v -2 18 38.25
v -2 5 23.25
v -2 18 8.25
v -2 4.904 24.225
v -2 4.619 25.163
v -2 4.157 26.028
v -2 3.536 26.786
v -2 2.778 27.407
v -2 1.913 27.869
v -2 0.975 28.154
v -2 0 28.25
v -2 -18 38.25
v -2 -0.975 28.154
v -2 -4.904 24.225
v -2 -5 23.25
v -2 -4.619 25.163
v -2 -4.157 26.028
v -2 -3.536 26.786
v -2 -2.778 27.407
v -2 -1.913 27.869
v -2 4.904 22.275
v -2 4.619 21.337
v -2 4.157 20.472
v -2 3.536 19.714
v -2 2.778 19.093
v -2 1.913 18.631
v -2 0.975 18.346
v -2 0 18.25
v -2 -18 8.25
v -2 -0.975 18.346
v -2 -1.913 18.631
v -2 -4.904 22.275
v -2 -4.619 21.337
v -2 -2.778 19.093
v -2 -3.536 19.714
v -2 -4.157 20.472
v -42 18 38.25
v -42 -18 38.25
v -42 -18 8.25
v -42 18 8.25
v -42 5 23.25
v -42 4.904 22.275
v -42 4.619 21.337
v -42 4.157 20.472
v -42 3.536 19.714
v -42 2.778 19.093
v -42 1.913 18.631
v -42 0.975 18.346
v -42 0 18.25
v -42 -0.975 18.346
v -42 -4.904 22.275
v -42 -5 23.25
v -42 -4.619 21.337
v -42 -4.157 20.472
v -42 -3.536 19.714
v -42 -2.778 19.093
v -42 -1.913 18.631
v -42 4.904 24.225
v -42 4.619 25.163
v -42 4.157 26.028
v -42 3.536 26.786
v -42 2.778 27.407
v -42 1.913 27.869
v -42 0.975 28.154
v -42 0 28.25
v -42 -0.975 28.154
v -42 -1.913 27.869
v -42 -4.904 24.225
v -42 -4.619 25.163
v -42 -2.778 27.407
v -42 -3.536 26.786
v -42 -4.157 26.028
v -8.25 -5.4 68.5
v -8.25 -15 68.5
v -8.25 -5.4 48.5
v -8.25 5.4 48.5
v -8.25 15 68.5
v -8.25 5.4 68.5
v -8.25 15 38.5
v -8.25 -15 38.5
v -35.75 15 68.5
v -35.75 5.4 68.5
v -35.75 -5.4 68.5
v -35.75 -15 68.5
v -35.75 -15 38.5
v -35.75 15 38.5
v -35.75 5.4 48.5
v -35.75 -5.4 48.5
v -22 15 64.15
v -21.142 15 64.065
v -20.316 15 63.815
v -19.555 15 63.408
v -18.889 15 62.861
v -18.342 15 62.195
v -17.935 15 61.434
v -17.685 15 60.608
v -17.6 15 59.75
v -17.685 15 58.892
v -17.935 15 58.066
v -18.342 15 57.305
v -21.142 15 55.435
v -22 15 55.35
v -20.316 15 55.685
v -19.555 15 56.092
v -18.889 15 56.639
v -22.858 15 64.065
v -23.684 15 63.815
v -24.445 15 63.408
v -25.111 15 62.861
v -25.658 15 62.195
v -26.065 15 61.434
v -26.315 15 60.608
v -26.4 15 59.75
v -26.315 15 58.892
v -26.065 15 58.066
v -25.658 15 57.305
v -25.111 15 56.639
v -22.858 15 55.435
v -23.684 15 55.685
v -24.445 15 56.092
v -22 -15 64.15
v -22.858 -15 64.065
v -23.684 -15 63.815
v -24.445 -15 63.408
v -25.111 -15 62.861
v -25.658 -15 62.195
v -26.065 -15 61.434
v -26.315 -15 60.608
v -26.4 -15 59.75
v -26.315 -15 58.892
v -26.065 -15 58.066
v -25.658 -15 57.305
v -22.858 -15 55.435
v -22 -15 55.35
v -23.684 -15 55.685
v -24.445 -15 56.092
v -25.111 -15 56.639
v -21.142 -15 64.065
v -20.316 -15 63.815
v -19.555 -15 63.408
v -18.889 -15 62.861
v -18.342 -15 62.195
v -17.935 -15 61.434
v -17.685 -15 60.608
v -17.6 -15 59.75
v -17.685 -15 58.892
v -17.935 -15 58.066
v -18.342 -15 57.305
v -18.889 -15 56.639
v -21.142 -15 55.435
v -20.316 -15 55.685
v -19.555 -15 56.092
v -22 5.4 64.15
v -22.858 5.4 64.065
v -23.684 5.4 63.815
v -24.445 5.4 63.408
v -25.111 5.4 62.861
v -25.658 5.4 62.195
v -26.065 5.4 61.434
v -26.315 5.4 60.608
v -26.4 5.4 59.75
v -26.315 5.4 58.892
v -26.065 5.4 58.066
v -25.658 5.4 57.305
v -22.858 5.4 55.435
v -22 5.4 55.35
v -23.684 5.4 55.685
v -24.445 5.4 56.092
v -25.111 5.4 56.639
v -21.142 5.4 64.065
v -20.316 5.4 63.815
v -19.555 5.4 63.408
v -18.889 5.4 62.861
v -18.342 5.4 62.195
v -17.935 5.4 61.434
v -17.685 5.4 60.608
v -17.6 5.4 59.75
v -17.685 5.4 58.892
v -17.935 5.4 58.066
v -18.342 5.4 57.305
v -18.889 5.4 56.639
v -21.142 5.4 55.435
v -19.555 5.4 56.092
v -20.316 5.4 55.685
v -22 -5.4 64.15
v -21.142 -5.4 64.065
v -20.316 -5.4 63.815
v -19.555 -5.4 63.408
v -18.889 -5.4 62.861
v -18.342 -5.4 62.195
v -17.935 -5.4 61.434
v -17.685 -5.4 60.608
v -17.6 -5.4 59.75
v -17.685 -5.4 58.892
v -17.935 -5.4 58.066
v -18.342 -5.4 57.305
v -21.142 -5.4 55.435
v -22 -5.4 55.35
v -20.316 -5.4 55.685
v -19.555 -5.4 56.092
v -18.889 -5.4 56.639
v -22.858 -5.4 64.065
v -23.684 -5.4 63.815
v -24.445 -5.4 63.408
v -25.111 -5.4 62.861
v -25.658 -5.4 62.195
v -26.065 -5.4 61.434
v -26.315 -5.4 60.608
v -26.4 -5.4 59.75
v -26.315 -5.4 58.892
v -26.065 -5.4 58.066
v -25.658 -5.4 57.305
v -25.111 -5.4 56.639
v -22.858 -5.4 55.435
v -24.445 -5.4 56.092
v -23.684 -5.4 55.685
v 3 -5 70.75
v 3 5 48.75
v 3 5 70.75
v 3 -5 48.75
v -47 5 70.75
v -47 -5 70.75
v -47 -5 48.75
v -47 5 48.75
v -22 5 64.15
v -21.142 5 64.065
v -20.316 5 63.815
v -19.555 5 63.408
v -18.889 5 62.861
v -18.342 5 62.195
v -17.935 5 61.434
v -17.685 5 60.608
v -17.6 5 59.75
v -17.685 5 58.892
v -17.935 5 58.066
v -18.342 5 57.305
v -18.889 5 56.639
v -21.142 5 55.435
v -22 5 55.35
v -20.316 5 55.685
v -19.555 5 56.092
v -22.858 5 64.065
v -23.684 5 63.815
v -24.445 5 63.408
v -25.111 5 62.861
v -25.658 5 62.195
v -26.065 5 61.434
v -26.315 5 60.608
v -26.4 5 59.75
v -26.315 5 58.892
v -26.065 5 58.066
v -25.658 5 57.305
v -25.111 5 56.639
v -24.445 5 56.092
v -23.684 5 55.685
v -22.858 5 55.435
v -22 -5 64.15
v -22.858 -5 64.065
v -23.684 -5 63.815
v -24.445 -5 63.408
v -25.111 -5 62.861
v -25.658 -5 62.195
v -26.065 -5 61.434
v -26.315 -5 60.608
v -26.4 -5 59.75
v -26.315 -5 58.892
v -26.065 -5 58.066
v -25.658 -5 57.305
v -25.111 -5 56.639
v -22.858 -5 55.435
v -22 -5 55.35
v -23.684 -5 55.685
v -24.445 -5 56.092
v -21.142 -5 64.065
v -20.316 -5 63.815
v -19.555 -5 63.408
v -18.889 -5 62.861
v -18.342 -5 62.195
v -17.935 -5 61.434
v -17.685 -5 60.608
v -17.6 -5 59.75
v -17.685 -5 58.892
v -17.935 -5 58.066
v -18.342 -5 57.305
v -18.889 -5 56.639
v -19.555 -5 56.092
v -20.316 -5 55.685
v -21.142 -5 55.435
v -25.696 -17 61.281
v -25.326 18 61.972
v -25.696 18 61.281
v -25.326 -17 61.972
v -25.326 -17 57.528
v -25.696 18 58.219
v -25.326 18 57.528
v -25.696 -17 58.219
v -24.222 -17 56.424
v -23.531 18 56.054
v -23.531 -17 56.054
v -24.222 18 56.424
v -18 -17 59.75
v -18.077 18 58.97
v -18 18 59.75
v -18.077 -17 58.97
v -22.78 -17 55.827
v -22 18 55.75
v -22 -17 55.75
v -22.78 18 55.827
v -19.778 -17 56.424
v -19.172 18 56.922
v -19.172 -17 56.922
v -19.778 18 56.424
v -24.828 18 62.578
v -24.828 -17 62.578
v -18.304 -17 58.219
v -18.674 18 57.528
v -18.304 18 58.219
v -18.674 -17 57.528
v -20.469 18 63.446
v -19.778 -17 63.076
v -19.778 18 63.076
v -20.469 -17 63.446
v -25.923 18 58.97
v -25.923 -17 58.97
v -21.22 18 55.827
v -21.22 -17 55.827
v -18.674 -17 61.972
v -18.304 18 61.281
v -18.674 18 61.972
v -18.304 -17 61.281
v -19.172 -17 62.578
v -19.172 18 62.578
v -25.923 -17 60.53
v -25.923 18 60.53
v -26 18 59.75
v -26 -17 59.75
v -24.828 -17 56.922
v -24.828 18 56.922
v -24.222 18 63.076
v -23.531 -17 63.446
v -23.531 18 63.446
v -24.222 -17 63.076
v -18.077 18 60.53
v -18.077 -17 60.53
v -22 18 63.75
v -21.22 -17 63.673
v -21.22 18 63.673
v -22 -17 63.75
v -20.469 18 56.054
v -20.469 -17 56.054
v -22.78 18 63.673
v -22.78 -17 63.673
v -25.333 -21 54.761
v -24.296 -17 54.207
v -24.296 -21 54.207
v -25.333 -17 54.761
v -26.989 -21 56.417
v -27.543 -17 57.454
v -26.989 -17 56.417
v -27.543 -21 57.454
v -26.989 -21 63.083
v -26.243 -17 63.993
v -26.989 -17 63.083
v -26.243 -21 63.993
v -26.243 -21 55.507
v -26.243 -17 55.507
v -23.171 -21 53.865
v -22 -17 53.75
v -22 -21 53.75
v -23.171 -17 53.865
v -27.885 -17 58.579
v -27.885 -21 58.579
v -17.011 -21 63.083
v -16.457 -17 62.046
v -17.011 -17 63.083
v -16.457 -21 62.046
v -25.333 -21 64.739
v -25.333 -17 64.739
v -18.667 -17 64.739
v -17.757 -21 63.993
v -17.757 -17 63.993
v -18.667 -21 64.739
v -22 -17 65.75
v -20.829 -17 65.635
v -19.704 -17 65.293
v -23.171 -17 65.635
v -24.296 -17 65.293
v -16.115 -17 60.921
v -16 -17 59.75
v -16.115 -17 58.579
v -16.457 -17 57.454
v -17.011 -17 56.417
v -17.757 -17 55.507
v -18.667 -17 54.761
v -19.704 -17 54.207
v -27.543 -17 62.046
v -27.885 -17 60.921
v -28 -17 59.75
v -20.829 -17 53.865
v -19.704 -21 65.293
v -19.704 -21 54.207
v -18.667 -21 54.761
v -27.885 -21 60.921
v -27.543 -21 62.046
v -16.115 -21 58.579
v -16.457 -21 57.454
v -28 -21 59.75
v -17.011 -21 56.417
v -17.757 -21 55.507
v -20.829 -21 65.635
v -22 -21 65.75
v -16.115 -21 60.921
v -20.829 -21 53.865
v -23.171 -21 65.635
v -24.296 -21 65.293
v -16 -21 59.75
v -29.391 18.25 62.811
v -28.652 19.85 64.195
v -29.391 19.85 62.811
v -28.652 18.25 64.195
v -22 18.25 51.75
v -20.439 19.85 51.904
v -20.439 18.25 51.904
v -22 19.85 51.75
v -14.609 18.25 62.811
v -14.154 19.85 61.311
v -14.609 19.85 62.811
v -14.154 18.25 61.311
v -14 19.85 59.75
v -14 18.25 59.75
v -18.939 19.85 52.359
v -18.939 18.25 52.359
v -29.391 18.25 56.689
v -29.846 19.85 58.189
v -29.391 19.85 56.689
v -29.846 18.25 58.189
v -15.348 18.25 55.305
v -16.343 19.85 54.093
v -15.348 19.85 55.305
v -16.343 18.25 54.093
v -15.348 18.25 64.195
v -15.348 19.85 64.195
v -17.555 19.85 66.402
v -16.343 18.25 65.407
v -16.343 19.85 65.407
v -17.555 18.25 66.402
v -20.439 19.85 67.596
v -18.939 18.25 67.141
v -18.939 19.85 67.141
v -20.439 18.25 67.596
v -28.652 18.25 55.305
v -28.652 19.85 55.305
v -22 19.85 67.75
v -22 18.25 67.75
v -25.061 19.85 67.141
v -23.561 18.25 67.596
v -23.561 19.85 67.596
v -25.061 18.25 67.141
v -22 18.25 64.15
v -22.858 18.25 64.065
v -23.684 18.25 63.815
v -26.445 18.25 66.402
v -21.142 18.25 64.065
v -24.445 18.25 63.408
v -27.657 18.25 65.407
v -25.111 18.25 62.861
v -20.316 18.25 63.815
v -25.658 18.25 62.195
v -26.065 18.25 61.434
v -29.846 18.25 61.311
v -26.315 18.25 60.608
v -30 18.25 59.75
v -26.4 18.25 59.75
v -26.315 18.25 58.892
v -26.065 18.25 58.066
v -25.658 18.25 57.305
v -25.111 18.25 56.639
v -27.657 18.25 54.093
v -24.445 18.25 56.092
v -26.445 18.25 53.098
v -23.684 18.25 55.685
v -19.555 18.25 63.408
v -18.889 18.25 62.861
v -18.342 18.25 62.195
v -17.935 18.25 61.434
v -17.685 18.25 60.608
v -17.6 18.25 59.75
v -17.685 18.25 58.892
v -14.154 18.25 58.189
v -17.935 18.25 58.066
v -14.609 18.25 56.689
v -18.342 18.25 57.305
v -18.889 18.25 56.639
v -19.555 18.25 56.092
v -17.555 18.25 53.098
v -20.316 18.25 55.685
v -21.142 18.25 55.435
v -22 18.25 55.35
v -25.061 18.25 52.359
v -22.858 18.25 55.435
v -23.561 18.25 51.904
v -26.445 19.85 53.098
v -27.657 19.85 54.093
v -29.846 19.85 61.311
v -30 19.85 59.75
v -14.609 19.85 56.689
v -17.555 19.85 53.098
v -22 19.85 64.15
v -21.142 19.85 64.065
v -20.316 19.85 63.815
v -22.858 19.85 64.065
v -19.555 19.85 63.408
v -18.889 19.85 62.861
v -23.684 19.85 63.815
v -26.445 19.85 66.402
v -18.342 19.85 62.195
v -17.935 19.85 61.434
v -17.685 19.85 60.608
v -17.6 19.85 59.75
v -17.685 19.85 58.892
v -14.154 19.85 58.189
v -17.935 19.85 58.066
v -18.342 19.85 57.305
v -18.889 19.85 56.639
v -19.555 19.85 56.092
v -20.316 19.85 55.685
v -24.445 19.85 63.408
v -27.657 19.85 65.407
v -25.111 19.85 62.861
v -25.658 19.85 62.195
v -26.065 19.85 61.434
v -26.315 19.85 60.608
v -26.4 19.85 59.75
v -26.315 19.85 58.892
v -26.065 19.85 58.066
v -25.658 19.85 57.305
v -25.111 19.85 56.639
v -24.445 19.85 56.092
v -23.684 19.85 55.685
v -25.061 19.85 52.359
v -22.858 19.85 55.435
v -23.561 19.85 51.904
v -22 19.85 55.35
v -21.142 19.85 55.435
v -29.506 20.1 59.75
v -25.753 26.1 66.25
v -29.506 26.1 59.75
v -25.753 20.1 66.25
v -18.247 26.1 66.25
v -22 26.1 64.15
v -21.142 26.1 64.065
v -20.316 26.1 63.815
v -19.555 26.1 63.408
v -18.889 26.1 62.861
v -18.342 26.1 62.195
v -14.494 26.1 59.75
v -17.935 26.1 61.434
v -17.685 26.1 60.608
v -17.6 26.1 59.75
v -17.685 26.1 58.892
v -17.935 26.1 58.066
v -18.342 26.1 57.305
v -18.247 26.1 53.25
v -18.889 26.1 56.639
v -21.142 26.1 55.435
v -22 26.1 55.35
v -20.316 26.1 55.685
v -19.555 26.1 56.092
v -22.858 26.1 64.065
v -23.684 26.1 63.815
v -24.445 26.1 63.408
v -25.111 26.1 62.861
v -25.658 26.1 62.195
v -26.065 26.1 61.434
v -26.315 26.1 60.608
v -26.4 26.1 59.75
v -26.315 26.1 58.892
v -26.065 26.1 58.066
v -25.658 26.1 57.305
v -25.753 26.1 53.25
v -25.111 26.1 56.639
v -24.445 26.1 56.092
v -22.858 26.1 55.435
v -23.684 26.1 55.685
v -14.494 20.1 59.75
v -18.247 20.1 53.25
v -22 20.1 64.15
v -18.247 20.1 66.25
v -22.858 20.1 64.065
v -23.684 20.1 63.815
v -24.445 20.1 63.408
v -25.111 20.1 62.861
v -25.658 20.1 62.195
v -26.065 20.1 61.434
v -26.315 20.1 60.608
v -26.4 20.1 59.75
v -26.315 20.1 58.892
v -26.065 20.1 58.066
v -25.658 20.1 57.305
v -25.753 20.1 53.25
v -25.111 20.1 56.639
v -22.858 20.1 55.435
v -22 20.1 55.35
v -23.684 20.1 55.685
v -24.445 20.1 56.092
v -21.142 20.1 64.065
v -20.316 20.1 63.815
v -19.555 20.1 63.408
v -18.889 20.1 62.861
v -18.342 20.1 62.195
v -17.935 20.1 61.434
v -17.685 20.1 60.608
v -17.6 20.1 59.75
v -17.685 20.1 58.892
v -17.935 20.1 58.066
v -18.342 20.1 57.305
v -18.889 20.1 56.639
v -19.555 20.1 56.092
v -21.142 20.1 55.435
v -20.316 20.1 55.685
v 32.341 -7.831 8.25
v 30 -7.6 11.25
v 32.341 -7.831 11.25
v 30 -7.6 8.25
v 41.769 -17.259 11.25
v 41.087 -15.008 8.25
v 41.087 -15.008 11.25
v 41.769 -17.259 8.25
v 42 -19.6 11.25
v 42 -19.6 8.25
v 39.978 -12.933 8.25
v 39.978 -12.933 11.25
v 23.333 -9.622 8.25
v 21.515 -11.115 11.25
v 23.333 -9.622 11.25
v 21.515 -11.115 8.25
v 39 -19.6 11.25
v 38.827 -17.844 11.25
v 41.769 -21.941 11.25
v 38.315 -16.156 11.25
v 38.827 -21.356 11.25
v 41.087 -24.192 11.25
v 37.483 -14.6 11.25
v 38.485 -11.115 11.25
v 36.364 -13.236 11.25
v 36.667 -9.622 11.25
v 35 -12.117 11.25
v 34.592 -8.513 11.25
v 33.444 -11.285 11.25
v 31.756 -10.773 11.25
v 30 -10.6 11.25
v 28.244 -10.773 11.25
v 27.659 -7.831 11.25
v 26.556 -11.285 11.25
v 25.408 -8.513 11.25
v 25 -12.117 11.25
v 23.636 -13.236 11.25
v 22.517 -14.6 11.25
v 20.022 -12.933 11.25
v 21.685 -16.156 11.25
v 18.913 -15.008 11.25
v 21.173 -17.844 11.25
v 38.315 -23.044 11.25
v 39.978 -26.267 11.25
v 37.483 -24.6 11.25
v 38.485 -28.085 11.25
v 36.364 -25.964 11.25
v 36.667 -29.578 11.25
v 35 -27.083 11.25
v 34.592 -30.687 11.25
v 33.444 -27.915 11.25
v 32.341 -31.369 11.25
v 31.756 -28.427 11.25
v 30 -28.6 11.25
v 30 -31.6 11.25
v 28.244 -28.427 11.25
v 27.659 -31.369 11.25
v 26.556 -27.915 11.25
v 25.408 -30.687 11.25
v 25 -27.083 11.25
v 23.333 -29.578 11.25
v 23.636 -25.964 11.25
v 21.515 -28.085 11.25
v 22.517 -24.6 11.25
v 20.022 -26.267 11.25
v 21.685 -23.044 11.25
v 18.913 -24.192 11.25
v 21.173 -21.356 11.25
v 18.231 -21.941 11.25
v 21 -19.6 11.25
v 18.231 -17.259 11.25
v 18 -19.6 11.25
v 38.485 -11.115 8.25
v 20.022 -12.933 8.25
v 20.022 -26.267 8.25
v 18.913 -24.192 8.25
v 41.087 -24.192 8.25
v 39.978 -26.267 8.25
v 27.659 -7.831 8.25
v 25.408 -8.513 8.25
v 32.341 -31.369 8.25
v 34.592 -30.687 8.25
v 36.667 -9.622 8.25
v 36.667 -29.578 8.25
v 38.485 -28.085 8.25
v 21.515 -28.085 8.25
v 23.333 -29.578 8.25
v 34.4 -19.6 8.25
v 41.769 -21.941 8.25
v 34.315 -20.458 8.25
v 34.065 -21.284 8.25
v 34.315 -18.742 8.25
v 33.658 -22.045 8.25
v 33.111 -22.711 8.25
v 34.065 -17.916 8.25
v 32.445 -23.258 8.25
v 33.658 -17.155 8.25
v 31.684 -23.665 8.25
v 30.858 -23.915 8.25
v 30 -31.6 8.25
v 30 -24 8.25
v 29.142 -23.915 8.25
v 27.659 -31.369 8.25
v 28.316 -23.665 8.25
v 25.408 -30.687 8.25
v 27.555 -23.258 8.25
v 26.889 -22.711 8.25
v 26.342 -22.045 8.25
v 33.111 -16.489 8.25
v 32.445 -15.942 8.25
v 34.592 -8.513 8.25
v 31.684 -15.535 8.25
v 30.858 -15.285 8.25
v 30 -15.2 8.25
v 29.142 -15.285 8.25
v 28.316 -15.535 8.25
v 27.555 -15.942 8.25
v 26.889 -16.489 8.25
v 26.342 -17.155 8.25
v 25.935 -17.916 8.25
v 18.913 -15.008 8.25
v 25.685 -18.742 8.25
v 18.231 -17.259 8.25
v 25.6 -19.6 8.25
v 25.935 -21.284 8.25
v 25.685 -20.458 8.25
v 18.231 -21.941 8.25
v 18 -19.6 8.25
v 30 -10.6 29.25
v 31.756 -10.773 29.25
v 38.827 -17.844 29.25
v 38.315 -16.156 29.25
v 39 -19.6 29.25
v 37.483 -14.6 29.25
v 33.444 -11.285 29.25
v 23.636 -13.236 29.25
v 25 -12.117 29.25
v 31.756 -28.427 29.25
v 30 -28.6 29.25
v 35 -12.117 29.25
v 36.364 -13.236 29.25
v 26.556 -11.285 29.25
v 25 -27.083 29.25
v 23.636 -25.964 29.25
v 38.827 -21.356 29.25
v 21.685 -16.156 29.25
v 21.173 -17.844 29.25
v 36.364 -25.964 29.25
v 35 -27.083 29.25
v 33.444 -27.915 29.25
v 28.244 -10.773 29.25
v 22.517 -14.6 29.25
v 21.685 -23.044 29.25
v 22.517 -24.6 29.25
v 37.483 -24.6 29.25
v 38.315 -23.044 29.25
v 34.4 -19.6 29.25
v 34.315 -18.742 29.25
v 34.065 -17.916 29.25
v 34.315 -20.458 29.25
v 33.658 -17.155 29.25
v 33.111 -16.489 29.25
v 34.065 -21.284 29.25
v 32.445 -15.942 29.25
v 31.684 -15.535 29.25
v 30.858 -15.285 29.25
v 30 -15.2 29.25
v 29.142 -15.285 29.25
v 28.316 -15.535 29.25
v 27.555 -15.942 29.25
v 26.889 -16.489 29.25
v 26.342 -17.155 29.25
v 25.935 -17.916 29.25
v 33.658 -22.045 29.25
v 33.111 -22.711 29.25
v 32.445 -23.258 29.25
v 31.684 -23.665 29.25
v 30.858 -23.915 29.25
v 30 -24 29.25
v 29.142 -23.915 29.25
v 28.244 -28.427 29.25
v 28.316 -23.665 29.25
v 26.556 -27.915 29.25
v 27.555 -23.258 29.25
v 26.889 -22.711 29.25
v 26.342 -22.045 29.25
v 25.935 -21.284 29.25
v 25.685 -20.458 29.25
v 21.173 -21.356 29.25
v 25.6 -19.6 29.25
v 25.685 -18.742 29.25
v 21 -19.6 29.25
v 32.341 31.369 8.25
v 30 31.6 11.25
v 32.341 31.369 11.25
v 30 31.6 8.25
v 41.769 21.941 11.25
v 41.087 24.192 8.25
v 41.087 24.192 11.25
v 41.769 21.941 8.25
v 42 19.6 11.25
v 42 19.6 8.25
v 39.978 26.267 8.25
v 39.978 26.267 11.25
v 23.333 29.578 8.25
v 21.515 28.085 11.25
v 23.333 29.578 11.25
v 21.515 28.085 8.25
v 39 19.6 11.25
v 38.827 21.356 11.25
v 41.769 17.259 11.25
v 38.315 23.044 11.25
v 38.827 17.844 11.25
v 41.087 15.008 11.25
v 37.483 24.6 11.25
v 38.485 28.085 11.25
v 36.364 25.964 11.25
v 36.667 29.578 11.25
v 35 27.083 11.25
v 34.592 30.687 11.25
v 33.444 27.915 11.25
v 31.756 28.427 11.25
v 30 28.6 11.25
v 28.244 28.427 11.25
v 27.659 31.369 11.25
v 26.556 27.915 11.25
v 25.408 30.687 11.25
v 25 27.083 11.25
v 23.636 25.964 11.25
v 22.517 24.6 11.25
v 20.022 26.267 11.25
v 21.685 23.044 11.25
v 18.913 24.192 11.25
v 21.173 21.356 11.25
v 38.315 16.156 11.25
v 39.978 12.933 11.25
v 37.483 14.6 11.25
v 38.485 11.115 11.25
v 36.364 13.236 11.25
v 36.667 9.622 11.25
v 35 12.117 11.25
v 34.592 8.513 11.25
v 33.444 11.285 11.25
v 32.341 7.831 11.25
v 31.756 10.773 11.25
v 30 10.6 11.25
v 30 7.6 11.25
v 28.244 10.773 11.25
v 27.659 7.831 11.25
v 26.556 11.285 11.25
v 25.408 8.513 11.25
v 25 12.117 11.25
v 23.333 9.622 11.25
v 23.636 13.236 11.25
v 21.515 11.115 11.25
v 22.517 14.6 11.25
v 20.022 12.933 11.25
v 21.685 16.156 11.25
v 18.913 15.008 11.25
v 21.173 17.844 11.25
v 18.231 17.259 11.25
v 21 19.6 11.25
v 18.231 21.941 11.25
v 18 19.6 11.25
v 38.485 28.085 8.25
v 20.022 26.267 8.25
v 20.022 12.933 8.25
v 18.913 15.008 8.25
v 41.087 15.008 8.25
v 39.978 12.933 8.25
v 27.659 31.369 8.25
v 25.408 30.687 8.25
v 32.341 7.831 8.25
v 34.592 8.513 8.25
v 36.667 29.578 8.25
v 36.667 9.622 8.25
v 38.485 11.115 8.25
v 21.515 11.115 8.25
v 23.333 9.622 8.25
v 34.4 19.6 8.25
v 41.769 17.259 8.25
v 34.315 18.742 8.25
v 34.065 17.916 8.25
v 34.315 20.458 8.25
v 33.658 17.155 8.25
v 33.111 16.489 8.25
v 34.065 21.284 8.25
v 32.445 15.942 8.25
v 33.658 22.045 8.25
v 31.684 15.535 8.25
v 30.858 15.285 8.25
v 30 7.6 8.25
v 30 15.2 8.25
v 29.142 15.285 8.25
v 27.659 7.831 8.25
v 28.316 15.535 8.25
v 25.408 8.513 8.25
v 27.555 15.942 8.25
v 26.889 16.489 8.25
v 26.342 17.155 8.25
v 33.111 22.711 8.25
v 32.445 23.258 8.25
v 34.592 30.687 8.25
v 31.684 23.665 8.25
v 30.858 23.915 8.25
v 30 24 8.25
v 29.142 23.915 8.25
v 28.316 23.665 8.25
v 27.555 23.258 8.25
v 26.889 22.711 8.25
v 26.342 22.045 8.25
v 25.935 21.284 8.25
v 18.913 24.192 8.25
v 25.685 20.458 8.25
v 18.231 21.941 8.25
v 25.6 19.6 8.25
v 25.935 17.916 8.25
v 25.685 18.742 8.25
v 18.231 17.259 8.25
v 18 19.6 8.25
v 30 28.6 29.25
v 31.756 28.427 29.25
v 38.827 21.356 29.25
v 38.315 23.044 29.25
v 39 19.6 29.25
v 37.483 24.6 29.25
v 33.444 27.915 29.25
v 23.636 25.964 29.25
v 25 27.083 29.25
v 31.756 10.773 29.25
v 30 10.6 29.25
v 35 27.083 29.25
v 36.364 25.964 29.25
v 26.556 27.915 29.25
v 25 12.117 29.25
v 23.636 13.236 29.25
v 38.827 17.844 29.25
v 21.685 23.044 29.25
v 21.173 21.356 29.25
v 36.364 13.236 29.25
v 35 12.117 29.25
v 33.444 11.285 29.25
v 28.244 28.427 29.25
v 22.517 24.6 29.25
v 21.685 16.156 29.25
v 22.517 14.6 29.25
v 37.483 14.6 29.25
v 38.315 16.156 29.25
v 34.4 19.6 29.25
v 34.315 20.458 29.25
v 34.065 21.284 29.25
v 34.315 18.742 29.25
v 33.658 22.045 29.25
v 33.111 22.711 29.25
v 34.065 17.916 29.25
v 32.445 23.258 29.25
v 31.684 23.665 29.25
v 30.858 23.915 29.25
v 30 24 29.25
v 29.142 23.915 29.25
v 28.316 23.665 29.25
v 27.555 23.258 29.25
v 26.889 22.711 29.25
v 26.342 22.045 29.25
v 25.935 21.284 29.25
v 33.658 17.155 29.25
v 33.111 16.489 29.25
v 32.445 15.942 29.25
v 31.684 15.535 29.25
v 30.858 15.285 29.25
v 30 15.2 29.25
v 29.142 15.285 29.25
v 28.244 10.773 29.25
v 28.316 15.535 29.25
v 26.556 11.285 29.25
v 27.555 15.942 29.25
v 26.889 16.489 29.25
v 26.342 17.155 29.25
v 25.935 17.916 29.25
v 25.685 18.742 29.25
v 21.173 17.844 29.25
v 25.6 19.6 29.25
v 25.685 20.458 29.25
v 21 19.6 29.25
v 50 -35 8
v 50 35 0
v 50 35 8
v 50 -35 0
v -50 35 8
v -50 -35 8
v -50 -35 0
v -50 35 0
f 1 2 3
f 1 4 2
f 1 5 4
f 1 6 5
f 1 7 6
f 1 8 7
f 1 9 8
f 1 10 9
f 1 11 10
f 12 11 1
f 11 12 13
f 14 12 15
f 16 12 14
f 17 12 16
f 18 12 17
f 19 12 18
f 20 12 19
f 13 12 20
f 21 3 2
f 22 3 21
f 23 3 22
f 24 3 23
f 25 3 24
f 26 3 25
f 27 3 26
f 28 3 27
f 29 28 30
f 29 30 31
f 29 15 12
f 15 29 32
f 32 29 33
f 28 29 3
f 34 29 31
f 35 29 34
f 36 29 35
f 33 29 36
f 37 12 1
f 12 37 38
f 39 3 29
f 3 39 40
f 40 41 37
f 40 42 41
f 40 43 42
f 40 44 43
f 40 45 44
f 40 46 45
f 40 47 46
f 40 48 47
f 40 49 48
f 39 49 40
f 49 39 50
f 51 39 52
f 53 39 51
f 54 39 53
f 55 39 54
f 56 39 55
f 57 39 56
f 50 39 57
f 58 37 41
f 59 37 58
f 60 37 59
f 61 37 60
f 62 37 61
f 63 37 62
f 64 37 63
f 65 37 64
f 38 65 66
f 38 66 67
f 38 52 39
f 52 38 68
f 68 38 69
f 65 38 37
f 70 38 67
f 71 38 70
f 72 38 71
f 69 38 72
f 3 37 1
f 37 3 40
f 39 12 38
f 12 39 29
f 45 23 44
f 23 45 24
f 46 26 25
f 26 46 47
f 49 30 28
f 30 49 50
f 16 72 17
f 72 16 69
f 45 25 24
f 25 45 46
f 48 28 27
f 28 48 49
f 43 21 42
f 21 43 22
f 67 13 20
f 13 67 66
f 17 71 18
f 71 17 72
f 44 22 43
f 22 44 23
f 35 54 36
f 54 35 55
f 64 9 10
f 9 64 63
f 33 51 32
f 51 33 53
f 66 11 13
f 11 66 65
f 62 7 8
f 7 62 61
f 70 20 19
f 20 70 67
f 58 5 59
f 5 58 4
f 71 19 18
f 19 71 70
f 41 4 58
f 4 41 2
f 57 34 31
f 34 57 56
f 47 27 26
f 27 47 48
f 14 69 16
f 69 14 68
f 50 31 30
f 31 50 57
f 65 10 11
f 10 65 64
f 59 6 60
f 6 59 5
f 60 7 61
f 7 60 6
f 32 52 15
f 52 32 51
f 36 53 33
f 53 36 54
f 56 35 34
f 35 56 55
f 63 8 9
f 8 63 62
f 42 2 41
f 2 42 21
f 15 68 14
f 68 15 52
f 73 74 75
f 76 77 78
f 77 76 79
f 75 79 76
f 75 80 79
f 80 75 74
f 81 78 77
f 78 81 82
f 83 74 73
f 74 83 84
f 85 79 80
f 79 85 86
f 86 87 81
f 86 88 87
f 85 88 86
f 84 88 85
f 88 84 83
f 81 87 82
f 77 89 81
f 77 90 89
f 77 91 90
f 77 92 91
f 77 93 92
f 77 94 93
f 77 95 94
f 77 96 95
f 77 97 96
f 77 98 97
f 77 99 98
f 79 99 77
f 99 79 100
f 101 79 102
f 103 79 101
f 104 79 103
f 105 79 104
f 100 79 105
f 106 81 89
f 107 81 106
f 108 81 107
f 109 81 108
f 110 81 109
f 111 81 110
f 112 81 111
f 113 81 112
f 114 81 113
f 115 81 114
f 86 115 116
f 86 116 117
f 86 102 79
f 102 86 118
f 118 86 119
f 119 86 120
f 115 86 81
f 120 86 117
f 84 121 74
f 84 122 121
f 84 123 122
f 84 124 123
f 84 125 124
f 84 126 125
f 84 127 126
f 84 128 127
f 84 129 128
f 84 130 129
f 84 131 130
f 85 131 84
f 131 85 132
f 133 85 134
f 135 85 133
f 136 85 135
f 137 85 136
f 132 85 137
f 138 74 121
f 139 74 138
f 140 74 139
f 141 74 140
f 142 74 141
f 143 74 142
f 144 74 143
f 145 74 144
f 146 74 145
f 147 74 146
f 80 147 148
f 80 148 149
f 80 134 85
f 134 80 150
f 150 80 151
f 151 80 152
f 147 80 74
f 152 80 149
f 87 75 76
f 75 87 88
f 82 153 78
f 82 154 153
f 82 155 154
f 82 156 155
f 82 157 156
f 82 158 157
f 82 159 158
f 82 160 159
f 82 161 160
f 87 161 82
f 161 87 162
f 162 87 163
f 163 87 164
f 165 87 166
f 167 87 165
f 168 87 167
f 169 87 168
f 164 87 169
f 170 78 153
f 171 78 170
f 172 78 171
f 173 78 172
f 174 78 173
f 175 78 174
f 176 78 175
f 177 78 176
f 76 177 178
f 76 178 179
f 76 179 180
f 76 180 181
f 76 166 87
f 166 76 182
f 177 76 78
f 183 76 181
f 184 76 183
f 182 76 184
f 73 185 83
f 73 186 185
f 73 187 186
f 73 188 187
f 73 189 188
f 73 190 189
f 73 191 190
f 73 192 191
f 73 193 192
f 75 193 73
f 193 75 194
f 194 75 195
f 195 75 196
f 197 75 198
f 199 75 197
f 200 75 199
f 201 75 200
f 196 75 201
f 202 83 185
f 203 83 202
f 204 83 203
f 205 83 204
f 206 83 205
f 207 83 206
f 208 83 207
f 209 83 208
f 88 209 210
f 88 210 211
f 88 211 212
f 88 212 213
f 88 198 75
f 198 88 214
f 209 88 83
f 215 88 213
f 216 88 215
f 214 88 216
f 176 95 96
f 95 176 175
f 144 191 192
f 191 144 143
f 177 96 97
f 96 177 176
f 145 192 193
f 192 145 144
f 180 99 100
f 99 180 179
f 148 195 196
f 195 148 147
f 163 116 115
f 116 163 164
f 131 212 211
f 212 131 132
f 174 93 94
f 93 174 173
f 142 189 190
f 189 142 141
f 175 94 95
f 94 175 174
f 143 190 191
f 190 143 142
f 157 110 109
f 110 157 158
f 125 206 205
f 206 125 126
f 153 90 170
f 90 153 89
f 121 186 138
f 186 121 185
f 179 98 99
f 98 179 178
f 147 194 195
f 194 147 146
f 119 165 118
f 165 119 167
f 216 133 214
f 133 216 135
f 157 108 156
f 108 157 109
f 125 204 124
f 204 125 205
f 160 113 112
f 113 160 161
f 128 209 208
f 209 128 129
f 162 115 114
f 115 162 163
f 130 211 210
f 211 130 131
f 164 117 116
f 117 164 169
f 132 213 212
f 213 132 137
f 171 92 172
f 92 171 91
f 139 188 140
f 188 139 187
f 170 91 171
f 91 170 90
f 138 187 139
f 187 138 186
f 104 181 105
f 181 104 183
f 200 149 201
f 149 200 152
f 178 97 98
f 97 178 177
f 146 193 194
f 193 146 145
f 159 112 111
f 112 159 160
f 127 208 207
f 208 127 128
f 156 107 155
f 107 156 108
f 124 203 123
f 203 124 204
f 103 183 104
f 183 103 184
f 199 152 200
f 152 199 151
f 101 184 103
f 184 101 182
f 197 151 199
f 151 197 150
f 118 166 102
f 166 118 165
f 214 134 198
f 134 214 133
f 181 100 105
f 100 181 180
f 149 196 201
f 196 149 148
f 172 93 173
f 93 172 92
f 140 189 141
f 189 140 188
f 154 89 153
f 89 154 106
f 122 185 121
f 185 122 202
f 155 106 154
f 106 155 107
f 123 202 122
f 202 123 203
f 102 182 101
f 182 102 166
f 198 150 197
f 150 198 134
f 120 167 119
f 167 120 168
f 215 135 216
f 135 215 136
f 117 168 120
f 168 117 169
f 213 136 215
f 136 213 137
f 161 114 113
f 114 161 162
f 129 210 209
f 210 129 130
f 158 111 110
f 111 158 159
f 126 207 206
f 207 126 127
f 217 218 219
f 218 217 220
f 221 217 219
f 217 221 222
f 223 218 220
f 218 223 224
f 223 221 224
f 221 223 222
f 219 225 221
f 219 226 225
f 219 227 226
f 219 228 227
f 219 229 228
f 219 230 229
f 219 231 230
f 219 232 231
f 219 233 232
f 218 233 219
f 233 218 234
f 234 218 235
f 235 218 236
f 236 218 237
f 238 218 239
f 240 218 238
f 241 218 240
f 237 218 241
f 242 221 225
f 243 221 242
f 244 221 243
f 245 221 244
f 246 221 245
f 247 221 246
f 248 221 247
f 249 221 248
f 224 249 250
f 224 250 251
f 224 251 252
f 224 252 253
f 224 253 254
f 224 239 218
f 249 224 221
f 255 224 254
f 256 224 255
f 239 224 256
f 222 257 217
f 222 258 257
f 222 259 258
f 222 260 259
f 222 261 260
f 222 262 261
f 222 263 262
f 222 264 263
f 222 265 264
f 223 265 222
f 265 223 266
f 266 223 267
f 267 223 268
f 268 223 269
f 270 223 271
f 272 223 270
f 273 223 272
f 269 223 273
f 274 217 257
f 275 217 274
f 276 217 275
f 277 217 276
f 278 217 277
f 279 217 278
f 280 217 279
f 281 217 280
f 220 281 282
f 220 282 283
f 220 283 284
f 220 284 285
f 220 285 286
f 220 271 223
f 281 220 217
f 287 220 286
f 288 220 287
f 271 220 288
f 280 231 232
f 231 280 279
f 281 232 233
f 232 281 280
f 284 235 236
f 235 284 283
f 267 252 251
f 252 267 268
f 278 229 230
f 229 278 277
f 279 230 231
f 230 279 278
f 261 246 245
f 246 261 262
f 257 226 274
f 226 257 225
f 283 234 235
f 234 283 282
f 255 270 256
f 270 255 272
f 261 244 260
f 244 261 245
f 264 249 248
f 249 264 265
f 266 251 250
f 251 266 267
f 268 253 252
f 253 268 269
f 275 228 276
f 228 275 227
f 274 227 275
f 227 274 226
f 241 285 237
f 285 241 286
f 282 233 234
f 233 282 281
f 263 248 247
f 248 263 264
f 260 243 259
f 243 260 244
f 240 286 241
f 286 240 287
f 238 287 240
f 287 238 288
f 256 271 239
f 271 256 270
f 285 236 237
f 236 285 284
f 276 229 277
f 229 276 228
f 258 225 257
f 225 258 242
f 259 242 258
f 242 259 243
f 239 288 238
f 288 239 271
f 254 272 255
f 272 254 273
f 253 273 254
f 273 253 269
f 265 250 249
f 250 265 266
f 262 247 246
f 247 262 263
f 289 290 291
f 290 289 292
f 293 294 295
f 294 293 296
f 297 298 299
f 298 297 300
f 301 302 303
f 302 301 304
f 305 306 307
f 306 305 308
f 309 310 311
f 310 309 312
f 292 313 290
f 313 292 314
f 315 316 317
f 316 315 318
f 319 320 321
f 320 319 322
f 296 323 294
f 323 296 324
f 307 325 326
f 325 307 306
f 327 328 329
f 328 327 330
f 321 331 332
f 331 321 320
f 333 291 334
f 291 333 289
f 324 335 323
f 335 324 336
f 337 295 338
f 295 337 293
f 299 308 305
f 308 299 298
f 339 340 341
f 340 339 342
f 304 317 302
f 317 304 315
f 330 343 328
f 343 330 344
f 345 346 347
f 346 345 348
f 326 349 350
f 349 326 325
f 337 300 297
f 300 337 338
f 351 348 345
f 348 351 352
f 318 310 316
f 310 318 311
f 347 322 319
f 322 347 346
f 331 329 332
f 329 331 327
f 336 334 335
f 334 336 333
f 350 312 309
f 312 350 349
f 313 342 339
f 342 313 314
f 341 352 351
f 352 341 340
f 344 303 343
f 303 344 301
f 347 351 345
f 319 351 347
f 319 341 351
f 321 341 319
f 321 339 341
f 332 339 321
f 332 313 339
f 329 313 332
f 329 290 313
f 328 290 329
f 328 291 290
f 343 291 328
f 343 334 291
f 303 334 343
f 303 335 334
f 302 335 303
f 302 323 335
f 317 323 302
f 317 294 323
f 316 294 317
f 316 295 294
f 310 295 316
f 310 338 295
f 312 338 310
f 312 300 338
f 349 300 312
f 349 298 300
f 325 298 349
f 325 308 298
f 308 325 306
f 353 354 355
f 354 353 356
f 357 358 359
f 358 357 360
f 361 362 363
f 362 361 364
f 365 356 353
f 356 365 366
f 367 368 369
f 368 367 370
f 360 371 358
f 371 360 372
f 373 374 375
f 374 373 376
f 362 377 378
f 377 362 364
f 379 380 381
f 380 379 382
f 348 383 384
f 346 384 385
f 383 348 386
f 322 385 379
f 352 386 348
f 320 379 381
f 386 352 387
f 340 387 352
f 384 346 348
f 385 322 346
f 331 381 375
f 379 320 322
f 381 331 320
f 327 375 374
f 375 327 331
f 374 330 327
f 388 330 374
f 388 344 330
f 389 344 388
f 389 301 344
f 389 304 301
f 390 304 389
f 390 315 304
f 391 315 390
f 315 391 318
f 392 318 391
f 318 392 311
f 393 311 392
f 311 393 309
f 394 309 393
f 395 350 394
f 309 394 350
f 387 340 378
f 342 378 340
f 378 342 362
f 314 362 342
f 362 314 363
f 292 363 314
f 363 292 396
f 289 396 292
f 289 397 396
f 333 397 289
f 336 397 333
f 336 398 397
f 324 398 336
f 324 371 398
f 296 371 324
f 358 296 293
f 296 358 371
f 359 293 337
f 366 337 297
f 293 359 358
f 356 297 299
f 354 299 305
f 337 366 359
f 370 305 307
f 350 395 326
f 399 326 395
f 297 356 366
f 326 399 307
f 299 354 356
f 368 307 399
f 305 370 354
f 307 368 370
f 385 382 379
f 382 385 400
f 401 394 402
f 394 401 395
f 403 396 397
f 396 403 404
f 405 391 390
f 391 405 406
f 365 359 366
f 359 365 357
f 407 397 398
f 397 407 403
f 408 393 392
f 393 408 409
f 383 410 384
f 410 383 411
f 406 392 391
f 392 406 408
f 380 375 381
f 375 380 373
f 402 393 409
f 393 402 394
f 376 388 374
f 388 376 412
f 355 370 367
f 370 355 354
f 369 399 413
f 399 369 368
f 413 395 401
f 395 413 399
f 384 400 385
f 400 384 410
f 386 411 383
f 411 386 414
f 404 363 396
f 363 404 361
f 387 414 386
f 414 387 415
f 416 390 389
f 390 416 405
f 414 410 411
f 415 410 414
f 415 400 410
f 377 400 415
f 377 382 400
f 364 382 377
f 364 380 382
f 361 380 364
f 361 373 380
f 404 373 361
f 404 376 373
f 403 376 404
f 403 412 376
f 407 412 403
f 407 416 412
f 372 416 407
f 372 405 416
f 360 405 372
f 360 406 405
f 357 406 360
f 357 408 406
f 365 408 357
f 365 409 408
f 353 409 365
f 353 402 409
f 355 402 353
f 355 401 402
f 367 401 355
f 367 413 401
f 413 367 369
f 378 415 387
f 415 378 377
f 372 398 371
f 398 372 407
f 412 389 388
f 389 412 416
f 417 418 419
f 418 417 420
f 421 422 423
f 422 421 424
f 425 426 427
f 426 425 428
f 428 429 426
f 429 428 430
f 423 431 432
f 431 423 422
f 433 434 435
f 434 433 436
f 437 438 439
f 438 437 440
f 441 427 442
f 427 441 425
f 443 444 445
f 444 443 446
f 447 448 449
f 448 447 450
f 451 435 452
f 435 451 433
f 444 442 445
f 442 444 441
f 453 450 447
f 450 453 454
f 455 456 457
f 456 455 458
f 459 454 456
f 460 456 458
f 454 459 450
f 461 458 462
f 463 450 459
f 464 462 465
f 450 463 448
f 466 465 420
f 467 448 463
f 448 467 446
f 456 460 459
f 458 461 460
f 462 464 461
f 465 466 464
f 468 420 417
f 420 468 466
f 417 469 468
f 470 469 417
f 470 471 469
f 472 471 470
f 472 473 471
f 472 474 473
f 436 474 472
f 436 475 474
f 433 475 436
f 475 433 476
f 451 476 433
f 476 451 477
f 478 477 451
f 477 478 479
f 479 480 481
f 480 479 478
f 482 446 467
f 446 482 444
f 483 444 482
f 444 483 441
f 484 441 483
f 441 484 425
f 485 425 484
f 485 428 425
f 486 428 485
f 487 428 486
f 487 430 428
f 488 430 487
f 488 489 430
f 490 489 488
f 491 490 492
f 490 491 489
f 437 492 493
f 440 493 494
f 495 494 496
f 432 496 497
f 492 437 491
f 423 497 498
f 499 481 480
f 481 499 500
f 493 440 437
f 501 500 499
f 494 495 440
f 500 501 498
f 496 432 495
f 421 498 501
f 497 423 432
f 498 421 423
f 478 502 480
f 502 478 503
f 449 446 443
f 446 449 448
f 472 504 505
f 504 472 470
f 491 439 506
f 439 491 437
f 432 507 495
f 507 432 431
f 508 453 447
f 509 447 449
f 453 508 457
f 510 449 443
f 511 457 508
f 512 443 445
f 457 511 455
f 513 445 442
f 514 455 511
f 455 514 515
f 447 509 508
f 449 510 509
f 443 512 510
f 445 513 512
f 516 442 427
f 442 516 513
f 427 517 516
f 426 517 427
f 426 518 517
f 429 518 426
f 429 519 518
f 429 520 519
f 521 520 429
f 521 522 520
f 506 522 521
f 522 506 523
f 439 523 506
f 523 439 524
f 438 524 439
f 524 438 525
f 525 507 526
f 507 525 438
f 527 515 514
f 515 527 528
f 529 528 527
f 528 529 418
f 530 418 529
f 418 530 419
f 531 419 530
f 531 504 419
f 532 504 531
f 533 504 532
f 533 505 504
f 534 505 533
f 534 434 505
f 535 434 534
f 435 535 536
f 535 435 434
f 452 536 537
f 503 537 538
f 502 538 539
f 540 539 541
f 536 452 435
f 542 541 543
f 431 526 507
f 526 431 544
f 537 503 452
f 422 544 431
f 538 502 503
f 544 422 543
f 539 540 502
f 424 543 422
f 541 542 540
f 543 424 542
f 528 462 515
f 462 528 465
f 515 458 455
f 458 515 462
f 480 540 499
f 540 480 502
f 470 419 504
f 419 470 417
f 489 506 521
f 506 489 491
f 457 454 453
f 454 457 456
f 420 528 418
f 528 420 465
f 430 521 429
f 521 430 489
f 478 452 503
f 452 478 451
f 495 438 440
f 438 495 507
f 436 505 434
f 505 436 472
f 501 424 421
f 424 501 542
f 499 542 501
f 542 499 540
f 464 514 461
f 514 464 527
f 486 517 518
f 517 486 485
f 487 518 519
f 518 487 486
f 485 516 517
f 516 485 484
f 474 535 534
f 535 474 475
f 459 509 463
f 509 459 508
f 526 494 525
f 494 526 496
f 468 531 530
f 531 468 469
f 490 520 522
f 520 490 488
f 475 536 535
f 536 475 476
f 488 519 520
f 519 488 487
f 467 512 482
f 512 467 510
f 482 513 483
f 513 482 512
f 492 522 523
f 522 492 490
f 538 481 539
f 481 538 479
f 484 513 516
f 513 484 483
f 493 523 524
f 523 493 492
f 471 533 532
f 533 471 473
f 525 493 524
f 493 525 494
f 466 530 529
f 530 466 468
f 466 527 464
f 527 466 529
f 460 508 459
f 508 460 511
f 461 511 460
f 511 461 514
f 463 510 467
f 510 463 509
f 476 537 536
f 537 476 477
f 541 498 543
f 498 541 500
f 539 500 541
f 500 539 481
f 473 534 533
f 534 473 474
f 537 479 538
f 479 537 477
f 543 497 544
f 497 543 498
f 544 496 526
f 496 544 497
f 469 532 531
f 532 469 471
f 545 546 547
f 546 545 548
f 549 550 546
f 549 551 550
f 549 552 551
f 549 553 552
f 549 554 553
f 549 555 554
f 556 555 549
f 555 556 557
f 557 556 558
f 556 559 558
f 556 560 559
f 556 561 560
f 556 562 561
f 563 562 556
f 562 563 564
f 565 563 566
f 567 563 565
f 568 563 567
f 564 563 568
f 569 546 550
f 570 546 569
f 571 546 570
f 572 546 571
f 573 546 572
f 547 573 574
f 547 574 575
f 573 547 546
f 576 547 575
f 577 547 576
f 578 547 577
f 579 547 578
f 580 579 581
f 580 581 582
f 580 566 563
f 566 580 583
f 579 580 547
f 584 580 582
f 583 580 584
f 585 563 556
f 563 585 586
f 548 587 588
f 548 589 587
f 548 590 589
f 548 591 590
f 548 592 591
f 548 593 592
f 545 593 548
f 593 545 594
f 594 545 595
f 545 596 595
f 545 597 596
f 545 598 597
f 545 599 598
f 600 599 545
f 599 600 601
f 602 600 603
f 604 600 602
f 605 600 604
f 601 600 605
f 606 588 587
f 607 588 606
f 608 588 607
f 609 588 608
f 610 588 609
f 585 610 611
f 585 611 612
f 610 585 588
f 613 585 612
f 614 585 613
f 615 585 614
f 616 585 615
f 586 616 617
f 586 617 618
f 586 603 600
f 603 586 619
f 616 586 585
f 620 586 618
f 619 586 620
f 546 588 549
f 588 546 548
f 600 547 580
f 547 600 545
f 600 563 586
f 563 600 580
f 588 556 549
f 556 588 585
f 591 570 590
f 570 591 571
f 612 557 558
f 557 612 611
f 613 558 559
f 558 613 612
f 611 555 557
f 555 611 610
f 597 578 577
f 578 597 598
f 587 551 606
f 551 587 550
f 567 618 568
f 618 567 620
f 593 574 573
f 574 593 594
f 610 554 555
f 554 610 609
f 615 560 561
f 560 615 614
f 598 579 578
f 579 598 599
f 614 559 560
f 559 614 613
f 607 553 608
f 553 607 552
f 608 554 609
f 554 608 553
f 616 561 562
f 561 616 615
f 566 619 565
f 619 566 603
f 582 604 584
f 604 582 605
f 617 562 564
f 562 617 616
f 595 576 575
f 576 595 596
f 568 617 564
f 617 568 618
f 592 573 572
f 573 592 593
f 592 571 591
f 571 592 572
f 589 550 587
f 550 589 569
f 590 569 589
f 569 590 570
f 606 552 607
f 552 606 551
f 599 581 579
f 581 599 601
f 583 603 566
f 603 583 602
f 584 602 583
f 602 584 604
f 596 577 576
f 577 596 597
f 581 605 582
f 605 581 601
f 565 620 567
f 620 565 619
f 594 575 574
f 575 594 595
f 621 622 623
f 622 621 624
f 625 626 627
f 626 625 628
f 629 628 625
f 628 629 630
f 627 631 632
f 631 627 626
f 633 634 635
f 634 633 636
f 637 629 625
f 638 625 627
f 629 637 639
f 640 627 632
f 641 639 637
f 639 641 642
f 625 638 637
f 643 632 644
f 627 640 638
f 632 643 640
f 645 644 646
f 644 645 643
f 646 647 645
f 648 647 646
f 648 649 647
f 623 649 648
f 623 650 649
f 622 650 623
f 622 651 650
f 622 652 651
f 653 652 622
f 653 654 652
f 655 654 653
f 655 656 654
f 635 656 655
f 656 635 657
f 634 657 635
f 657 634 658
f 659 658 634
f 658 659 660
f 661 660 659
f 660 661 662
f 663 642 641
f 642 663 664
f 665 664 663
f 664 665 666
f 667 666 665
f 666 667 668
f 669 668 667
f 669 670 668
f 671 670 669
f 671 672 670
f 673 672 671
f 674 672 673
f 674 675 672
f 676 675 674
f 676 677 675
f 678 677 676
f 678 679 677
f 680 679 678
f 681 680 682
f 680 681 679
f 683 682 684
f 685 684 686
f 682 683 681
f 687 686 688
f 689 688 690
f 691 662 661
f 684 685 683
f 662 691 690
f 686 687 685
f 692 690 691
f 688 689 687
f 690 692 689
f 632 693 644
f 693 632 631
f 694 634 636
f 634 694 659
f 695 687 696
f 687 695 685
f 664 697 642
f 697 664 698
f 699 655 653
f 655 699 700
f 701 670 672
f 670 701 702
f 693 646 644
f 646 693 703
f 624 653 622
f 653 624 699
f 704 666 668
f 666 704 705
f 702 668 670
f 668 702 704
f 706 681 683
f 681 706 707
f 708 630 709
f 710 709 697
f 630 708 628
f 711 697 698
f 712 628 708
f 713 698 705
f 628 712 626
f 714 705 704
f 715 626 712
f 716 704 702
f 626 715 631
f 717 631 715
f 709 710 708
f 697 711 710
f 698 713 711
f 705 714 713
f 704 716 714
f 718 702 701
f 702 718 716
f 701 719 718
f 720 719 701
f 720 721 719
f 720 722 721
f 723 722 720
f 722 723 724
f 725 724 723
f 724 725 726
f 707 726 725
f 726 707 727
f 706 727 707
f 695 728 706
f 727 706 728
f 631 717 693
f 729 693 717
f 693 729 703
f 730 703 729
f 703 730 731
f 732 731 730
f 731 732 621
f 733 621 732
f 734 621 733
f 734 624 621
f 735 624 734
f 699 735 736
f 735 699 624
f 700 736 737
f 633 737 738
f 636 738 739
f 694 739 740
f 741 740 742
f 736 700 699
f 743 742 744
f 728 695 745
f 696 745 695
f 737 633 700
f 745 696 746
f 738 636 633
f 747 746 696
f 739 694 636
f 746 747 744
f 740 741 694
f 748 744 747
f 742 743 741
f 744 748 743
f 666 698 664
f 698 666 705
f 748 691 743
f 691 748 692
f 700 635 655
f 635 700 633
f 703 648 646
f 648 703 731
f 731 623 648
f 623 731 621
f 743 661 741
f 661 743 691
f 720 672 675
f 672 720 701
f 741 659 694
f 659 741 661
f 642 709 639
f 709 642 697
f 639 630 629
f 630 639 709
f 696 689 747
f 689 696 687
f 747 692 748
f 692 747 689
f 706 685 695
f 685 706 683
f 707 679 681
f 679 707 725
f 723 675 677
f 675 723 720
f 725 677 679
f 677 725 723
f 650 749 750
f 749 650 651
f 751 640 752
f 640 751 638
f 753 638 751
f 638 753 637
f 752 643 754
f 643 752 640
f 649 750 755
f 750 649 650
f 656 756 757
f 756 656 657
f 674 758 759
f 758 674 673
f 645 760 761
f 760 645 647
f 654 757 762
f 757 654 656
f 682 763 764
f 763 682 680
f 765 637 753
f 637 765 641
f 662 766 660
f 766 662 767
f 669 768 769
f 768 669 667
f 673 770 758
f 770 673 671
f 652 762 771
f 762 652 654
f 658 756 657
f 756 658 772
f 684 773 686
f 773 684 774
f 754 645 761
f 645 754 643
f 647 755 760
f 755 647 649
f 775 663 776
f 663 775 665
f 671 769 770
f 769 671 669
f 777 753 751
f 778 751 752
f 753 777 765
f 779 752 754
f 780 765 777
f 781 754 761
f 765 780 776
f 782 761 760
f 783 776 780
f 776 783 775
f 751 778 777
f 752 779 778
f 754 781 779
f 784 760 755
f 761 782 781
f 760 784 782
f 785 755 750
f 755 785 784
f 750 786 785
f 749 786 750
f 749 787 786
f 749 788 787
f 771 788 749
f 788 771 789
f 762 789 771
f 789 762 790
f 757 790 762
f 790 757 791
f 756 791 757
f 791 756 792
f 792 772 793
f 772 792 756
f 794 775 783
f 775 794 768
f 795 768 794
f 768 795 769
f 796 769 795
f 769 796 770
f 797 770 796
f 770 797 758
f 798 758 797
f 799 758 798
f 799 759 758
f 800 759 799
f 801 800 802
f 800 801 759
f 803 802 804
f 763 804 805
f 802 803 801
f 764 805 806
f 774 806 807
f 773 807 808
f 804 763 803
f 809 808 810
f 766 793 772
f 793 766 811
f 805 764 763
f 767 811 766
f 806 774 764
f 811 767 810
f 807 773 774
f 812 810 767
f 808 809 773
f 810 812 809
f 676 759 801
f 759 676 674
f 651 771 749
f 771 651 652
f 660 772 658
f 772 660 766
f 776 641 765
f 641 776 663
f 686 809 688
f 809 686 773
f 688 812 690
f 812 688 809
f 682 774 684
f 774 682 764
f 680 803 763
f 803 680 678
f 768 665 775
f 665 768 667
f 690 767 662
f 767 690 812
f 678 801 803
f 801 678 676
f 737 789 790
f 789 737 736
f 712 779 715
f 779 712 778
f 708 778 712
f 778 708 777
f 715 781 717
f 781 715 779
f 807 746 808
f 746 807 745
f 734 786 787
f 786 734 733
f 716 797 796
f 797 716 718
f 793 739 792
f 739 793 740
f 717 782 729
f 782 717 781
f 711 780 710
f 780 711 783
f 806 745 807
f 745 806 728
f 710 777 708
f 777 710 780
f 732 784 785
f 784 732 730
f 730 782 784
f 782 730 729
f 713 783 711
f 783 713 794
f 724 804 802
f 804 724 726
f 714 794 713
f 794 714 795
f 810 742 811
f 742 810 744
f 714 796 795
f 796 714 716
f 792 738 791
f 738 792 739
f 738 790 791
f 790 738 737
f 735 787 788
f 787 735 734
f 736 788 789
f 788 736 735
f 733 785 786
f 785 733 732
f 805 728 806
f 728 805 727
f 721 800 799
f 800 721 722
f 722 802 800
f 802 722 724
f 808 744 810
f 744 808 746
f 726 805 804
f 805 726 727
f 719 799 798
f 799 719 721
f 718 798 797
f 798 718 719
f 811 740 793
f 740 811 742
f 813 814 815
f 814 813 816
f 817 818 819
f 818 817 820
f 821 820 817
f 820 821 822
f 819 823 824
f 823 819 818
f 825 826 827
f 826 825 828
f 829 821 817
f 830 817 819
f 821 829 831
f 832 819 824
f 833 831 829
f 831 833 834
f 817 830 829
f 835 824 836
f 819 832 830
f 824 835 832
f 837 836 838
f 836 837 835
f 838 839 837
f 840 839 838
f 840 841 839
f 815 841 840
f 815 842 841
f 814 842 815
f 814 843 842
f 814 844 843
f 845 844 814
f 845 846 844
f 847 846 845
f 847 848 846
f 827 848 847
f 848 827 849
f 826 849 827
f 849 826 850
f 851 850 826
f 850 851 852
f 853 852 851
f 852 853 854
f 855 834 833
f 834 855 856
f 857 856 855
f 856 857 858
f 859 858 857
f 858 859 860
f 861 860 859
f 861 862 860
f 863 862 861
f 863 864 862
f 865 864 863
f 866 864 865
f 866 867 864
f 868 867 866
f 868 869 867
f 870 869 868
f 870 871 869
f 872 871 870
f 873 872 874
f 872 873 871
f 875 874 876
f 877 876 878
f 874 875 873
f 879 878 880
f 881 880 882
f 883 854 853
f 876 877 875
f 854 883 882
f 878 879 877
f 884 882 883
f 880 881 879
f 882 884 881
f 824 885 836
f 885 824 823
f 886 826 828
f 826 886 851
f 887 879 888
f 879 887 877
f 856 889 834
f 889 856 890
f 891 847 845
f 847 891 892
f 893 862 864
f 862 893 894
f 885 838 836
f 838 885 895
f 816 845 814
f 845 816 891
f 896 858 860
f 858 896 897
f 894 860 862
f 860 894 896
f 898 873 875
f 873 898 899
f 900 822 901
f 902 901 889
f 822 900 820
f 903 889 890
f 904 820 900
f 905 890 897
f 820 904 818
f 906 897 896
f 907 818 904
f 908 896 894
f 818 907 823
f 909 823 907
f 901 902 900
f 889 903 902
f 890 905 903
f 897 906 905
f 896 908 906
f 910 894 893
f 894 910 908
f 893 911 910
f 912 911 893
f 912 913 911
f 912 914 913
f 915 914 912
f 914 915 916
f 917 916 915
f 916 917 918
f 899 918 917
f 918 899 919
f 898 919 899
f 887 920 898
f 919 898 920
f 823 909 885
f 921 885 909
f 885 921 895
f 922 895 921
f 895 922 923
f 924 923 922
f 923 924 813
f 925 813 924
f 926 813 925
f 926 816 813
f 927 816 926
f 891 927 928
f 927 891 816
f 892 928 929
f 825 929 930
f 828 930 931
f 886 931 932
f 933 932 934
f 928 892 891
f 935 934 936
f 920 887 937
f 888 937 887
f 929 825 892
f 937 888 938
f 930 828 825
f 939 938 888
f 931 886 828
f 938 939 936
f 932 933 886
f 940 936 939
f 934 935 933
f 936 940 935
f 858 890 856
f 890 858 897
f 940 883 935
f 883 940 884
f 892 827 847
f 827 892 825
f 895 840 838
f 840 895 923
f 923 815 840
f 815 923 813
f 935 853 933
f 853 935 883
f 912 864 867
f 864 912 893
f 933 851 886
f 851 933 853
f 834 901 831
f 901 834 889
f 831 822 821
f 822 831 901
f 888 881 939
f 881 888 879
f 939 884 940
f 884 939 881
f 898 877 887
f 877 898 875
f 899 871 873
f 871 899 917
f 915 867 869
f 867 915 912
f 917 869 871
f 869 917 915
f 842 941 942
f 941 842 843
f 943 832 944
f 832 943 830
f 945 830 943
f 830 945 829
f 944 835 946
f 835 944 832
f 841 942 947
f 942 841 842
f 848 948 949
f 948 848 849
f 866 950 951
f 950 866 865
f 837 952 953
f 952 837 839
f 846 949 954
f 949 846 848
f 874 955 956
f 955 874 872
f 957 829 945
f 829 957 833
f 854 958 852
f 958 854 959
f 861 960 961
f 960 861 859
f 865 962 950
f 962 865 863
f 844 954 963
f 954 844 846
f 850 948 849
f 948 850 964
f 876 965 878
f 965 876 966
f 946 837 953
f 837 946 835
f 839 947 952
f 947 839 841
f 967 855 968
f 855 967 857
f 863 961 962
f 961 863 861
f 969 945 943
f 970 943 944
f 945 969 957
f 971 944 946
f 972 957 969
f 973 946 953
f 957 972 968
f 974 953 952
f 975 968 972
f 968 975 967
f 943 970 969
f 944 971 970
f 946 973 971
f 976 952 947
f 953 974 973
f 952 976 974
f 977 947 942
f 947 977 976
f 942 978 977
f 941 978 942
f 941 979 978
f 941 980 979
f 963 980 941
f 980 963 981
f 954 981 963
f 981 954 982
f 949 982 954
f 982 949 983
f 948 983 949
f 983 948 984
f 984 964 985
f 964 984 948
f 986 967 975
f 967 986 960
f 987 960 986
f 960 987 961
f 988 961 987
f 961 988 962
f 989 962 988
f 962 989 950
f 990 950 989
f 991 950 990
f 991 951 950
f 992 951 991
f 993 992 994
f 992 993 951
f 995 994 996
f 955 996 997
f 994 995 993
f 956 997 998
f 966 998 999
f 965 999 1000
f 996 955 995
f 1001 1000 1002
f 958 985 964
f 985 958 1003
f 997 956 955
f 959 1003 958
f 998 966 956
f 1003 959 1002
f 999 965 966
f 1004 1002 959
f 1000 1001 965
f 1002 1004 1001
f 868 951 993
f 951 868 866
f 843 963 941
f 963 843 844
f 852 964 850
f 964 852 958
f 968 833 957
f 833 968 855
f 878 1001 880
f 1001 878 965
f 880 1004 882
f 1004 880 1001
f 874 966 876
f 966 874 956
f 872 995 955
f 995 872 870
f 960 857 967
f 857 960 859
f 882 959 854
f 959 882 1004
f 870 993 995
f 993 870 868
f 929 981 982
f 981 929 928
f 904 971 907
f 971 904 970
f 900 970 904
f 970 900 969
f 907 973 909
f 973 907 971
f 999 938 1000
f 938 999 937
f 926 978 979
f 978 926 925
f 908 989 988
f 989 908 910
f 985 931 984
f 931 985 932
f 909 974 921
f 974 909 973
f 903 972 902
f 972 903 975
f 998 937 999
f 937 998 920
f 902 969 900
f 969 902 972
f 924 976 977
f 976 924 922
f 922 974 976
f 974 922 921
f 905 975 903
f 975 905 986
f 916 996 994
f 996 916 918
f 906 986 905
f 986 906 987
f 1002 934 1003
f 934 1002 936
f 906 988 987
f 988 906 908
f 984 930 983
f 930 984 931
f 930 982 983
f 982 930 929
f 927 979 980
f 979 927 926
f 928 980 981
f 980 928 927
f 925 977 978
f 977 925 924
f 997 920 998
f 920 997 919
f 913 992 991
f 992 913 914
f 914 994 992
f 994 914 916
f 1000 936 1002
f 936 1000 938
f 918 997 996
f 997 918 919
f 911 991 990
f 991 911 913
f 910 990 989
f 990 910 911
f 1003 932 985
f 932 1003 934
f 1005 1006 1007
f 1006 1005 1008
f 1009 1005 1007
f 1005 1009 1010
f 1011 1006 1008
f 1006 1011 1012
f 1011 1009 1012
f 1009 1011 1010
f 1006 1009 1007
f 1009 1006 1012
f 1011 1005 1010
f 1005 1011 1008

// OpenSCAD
$fn = 32;

// ------------------------------------------------------------------------
// Indexing jig: plate 100 x 70 mm, pin d8
// Every part is its own module, assembly() places every instance.
// ------------------------------------------------------------------------

// --- part 1 ---
module jig_plate() {
  difference() {
    translate([-50, -35, 0]) cube([100, 70, 8]);
  }
}

// --- part 2 ---
module locator_block() {
  difference() {
    translate([-20, -18, 0]) cube([40, 36, 30]);
    translate([0, 0, 15]) rotate([0, 90, 0]) cylinder(h = 42, d = 10, center = true);
  }
}

// --- part 3 ---
module index_fork() {
  difference() {
    translate([-13.75, -15, 0]) cube([27.5, 30, 30]);
    translate([-14.75, -5.4, 10]) cube([29.5, 10.8, 21]);
    translate([0, 0, 21.25]) rotate([90, 0, 0]) cylinder(h = 32, d = 8.8, center = true);
  }
}

// --- part 4 ---
module index_arm() {
  difference() {
    translate([-25, -5, 0]) cube([50, 10, 22]);
    translate([0, 0, 11]) rotate([90, 0, 0]) cylinder(h = 12, d = 8.8, center = true);
  }
}

// --- part 5 ---
module index_pin() {
  rotate([0, 90, 0]) cylinder(h = 36, d = 8, center = true);
  translate([-21, 0, 0]) rotate([0, 90, 0]) cylinder(h = 4, d = 12);
}

// --- part 6 ---
module pin_washer() {
  difference() {
      translate([0, 0, 0]) cylinder(h = 1.6, d = 16);
      translate([0, 0, -1]) cylinder(h = 3.6, d = 8.8);
    }
}

// --- part 7 ---
module lock_nut() {
  difference() {
    linear_extrude(height = 6) polygon(points = [[7.506, 0], [3.753, 6.5], [-3.753, 6.5], [-7.506, 0], [-3.753, -6.5], [3.753, -6.5]]);
    translate([0, 0, -1]) cylinder(h = 8, d = 8.8);
  }
}

// --- part 8 ---
module guide_bush_a() {
  difference() {
    union() {
      cylinder(h = 3, d = 24);
      translate([0, 0, 3]) cylinder(h = 18, d = 18);
    }
    translate([0, 0, -1]) cylinder(h = 23, d = 8.8);
  }
}

// --- part 9 ---
module guide_bush_b() {
  difference() {
    union() {
      cylinder(h = 3, d = 24);
      translate([0, 0, 3]) cylinder(h = 18, d = 18);
    }
    translate([0, 0, -1]) cylinder(h = 23, d = 8.8);
  }
}

// --- assembly ---
module assembly() {
  color([0.80, 0.24, 0.20]) translate([0, 0, 0]) rotate([0, 0, 0]) jig_plate();
  color([0.20, 0.45, 0.75]) translate([-22, 0, 8.25]) rotate([0, 0, 0]) locator_block();
  color([0.25, 0.62, 0.32]) translate([-22, 0, 38.5]) rotate([0, 0, 0]) index_fork();
  color([0.92, 0.70, 0.18]) translate([-22, 0, 48.75]) rotate([0, 0, 0]) index_arm();
  color([0.58, 0.35, 0.70]) translate([-22, 0, 59.75]) rotate([0, 0, 90]) index_pin();
  color([0.16, 0.66, 0.66]) translate([-22, 19.85, 59.75]) rotate([90, 0, 0]) pin_washer();
  color([0.85, 0.48, 0.18]) translate([-22, 26.1, 59.75]) rotate([90, 0, 0]) lock_nut();
  color([0.55, 0.60, 0.65]) translate([30, -19.6, 8.25]) rotate([0, 0, 0]) guide_bush_a();
  color([0.75, 0.30, 0.55]) translate([30, 19.6, 8.25]) rotate([0, 0, 0]) guide_bush_b();
}

assembly();
